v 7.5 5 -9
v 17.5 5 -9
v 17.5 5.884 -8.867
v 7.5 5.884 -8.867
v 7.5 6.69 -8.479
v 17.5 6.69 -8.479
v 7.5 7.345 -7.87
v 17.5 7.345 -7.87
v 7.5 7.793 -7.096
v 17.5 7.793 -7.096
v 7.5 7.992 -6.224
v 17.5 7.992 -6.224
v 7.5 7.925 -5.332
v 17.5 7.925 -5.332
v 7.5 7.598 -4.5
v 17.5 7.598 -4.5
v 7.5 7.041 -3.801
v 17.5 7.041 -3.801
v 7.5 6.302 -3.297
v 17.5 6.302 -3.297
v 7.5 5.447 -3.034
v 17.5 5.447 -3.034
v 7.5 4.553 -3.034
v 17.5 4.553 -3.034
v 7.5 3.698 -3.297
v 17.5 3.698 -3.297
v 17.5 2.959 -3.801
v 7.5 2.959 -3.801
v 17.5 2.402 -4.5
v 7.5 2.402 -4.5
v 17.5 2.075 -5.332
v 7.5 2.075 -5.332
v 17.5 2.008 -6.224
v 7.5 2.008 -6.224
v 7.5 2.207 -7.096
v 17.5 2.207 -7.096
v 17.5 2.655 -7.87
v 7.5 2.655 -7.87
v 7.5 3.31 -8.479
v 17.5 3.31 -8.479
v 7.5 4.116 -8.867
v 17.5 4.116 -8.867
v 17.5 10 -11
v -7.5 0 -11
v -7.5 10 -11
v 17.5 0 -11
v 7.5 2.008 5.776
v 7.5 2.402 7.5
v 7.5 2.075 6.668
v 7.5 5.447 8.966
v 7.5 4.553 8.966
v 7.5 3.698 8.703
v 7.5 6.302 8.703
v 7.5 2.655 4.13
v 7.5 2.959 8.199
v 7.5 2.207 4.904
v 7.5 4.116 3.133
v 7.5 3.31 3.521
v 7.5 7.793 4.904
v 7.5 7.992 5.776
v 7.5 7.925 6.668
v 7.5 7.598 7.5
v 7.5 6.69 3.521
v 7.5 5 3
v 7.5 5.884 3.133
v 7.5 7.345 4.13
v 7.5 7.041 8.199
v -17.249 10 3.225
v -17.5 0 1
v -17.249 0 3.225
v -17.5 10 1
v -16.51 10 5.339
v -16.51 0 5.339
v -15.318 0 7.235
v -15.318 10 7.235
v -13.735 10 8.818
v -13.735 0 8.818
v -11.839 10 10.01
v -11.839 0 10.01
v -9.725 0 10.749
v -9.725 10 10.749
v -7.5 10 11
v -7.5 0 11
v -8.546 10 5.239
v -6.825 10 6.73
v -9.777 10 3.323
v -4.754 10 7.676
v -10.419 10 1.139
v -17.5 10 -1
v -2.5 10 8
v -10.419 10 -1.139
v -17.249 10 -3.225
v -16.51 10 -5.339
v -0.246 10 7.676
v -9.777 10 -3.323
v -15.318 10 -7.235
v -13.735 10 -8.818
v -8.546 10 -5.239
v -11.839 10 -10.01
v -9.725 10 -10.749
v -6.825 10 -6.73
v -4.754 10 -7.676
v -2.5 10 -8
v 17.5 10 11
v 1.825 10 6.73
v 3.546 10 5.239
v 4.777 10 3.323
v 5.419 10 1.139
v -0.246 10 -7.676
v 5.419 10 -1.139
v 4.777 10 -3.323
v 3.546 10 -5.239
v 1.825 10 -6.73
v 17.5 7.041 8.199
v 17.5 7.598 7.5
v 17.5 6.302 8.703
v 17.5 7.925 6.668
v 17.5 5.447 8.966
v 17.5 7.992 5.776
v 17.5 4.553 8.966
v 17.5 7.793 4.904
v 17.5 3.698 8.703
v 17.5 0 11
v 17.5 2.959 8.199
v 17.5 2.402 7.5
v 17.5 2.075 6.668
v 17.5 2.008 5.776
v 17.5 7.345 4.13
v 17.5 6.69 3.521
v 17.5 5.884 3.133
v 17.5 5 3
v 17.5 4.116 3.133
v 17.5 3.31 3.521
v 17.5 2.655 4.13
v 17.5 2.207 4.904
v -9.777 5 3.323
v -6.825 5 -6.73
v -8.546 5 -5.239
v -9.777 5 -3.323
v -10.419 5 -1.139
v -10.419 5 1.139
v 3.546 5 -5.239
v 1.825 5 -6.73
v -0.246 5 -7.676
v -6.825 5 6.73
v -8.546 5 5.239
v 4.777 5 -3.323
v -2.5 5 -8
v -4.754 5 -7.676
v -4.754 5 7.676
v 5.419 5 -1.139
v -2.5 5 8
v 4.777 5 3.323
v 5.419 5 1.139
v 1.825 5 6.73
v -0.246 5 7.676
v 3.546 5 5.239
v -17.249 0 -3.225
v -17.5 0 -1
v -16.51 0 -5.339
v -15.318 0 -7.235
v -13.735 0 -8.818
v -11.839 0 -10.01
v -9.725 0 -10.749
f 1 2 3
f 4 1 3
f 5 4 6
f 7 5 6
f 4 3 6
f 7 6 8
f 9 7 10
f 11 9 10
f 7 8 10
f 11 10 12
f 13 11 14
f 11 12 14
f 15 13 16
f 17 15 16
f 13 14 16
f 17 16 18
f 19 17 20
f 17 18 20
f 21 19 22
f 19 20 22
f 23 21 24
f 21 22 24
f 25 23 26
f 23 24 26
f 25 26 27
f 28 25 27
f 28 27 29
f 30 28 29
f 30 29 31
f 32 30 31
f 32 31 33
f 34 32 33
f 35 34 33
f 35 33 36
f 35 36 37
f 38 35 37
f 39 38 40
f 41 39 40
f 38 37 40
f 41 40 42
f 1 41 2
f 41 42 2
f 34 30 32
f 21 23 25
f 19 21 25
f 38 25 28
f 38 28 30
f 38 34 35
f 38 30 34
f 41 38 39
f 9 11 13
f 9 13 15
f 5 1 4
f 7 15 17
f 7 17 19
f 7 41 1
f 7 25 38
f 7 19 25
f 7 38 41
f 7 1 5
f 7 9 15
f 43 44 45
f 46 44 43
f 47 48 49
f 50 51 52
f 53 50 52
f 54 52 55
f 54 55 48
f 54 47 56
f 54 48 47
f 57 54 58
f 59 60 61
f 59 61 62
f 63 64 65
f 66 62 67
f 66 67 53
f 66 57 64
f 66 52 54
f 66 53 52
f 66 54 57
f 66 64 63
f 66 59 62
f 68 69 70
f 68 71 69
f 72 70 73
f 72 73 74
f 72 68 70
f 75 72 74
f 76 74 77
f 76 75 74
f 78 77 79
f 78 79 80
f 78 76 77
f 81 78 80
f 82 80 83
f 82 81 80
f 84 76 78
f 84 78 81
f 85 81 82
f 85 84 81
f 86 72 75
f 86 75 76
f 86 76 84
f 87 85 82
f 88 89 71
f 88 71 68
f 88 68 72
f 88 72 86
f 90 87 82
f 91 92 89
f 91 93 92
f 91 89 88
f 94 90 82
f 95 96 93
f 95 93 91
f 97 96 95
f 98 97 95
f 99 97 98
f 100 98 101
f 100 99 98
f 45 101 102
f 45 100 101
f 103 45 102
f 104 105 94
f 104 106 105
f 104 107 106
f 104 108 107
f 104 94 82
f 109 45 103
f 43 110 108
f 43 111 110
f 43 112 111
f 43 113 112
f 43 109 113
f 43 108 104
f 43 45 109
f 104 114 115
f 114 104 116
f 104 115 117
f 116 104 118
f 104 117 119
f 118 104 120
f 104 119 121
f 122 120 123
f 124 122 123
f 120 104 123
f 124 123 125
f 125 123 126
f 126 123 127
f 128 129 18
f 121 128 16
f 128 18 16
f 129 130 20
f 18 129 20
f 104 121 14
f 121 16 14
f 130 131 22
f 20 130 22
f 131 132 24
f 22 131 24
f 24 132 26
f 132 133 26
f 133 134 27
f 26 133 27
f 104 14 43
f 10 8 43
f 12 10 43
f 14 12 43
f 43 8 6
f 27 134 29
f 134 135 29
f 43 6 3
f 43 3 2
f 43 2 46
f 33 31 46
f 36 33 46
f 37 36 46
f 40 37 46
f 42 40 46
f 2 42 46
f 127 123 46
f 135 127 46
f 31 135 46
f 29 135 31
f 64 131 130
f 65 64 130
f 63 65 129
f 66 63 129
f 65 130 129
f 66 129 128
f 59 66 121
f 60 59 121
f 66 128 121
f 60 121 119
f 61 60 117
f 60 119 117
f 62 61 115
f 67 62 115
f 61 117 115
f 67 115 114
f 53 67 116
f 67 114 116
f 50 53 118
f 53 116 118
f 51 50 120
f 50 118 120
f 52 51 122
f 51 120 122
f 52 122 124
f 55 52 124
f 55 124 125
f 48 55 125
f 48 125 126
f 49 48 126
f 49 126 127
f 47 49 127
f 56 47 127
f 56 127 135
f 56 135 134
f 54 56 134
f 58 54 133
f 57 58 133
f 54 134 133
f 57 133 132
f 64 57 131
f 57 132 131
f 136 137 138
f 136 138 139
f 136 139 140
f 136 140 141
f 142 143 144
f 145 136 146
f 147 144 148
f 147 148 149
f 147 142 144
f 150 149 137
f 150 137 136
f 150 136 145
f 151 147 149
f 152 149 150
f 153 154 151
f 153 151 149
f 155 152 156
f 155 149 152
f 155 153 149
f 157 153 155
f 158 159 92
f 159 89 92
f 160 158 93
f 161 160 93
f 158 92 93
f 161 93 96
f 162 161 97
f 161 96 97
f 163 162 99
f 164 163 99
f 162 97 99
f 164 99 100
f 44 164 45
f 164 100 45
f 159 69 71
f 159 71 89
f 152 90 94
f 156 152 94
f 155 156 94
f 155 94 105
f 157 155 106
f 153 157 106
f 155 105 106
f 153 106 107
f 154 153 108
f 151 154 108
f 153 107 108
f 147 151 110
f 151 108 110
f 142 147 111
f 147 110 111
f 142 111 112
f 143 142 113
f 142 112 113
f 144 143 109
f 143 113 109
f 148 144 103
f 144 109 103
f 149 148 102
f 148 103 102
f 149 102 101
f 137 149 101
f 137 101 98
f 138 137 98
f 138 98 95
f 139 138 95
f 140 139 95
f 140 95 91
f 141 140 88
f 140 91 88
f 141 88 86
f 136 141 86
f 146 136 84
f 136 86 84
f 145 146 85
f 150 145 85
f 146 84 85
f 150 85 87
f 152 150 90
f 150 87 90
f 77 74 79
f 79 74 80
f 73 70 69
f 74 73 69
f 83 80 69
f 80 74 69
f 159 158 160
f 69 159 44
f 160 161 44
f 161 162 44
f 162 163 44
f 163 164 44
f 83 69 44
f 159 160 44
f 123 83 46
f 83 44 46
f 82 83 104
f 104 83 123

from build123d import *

# Parameters (mm, degrees)
SKETCH1_W           = 35
SKETCH1_H           = 22
BOSS_EXTRUDE1_DEPTH = 10
SKETCH2_R           = 3
CUT_EXTRUDE1_DEPTH  = 10
SKETCH3_R           = 8
CUT_EXTRUDE2_DEPTH  = 5
FILLET1_R           = 10


with BuildPart() as part:
    # Sketch1 → Boss-Extrude1 (new body)
    with BuildSketch(Plane(origin=(0, 0, 0), x_dir=(1, 0, 0), z_dir=(0, 1, 0))):
        Rectangle(SKETCH1_W, SKETCH1_H)
    extrude(amount=BOSS_EXTRUDE1_DEPTH)

    # Sketch2 → Cut-Extrude1 (cut)
    with BuildSketch(Plane(origin=(17.5, 0, 0), x_dir=(0, 0, -1), z_dir=(1, 0, 0))):
        with Locations((6, 5)):
            Circle(SKETCH2_R)
        with Locations((-6, 5)):
            Circle(SKETCH2_R)
    extrude(amount=-CUT_EXTRUDE1_DEPTH, mode=Mode.SUBTRACT)

    # Sketch3 → Cut-Extrude2 (cut)
    with BuildSketch(Plane(origin=(0, 10, 0), x_dir=(1, 0, 0), z_dir=(0, 1, 0))):
        with Locations(Location((-2.5, 0, 0), (0, 0, 270))):
            Circle(SKETCH3_R)
    extrude(amount=-CUT_EXTRUDE2_DEPTH, mode=Mode.SUBTRACT)

    # Fillet1
    fillet1_edges = [part.edges().sort_by_distance(p)[0] for p in [
        (-17.5, 5, 11),
        (-17.5, 5, -11),
    ]]
    fillet(fillet1_edges, radius=FILLET1_R)


solid = part.part
